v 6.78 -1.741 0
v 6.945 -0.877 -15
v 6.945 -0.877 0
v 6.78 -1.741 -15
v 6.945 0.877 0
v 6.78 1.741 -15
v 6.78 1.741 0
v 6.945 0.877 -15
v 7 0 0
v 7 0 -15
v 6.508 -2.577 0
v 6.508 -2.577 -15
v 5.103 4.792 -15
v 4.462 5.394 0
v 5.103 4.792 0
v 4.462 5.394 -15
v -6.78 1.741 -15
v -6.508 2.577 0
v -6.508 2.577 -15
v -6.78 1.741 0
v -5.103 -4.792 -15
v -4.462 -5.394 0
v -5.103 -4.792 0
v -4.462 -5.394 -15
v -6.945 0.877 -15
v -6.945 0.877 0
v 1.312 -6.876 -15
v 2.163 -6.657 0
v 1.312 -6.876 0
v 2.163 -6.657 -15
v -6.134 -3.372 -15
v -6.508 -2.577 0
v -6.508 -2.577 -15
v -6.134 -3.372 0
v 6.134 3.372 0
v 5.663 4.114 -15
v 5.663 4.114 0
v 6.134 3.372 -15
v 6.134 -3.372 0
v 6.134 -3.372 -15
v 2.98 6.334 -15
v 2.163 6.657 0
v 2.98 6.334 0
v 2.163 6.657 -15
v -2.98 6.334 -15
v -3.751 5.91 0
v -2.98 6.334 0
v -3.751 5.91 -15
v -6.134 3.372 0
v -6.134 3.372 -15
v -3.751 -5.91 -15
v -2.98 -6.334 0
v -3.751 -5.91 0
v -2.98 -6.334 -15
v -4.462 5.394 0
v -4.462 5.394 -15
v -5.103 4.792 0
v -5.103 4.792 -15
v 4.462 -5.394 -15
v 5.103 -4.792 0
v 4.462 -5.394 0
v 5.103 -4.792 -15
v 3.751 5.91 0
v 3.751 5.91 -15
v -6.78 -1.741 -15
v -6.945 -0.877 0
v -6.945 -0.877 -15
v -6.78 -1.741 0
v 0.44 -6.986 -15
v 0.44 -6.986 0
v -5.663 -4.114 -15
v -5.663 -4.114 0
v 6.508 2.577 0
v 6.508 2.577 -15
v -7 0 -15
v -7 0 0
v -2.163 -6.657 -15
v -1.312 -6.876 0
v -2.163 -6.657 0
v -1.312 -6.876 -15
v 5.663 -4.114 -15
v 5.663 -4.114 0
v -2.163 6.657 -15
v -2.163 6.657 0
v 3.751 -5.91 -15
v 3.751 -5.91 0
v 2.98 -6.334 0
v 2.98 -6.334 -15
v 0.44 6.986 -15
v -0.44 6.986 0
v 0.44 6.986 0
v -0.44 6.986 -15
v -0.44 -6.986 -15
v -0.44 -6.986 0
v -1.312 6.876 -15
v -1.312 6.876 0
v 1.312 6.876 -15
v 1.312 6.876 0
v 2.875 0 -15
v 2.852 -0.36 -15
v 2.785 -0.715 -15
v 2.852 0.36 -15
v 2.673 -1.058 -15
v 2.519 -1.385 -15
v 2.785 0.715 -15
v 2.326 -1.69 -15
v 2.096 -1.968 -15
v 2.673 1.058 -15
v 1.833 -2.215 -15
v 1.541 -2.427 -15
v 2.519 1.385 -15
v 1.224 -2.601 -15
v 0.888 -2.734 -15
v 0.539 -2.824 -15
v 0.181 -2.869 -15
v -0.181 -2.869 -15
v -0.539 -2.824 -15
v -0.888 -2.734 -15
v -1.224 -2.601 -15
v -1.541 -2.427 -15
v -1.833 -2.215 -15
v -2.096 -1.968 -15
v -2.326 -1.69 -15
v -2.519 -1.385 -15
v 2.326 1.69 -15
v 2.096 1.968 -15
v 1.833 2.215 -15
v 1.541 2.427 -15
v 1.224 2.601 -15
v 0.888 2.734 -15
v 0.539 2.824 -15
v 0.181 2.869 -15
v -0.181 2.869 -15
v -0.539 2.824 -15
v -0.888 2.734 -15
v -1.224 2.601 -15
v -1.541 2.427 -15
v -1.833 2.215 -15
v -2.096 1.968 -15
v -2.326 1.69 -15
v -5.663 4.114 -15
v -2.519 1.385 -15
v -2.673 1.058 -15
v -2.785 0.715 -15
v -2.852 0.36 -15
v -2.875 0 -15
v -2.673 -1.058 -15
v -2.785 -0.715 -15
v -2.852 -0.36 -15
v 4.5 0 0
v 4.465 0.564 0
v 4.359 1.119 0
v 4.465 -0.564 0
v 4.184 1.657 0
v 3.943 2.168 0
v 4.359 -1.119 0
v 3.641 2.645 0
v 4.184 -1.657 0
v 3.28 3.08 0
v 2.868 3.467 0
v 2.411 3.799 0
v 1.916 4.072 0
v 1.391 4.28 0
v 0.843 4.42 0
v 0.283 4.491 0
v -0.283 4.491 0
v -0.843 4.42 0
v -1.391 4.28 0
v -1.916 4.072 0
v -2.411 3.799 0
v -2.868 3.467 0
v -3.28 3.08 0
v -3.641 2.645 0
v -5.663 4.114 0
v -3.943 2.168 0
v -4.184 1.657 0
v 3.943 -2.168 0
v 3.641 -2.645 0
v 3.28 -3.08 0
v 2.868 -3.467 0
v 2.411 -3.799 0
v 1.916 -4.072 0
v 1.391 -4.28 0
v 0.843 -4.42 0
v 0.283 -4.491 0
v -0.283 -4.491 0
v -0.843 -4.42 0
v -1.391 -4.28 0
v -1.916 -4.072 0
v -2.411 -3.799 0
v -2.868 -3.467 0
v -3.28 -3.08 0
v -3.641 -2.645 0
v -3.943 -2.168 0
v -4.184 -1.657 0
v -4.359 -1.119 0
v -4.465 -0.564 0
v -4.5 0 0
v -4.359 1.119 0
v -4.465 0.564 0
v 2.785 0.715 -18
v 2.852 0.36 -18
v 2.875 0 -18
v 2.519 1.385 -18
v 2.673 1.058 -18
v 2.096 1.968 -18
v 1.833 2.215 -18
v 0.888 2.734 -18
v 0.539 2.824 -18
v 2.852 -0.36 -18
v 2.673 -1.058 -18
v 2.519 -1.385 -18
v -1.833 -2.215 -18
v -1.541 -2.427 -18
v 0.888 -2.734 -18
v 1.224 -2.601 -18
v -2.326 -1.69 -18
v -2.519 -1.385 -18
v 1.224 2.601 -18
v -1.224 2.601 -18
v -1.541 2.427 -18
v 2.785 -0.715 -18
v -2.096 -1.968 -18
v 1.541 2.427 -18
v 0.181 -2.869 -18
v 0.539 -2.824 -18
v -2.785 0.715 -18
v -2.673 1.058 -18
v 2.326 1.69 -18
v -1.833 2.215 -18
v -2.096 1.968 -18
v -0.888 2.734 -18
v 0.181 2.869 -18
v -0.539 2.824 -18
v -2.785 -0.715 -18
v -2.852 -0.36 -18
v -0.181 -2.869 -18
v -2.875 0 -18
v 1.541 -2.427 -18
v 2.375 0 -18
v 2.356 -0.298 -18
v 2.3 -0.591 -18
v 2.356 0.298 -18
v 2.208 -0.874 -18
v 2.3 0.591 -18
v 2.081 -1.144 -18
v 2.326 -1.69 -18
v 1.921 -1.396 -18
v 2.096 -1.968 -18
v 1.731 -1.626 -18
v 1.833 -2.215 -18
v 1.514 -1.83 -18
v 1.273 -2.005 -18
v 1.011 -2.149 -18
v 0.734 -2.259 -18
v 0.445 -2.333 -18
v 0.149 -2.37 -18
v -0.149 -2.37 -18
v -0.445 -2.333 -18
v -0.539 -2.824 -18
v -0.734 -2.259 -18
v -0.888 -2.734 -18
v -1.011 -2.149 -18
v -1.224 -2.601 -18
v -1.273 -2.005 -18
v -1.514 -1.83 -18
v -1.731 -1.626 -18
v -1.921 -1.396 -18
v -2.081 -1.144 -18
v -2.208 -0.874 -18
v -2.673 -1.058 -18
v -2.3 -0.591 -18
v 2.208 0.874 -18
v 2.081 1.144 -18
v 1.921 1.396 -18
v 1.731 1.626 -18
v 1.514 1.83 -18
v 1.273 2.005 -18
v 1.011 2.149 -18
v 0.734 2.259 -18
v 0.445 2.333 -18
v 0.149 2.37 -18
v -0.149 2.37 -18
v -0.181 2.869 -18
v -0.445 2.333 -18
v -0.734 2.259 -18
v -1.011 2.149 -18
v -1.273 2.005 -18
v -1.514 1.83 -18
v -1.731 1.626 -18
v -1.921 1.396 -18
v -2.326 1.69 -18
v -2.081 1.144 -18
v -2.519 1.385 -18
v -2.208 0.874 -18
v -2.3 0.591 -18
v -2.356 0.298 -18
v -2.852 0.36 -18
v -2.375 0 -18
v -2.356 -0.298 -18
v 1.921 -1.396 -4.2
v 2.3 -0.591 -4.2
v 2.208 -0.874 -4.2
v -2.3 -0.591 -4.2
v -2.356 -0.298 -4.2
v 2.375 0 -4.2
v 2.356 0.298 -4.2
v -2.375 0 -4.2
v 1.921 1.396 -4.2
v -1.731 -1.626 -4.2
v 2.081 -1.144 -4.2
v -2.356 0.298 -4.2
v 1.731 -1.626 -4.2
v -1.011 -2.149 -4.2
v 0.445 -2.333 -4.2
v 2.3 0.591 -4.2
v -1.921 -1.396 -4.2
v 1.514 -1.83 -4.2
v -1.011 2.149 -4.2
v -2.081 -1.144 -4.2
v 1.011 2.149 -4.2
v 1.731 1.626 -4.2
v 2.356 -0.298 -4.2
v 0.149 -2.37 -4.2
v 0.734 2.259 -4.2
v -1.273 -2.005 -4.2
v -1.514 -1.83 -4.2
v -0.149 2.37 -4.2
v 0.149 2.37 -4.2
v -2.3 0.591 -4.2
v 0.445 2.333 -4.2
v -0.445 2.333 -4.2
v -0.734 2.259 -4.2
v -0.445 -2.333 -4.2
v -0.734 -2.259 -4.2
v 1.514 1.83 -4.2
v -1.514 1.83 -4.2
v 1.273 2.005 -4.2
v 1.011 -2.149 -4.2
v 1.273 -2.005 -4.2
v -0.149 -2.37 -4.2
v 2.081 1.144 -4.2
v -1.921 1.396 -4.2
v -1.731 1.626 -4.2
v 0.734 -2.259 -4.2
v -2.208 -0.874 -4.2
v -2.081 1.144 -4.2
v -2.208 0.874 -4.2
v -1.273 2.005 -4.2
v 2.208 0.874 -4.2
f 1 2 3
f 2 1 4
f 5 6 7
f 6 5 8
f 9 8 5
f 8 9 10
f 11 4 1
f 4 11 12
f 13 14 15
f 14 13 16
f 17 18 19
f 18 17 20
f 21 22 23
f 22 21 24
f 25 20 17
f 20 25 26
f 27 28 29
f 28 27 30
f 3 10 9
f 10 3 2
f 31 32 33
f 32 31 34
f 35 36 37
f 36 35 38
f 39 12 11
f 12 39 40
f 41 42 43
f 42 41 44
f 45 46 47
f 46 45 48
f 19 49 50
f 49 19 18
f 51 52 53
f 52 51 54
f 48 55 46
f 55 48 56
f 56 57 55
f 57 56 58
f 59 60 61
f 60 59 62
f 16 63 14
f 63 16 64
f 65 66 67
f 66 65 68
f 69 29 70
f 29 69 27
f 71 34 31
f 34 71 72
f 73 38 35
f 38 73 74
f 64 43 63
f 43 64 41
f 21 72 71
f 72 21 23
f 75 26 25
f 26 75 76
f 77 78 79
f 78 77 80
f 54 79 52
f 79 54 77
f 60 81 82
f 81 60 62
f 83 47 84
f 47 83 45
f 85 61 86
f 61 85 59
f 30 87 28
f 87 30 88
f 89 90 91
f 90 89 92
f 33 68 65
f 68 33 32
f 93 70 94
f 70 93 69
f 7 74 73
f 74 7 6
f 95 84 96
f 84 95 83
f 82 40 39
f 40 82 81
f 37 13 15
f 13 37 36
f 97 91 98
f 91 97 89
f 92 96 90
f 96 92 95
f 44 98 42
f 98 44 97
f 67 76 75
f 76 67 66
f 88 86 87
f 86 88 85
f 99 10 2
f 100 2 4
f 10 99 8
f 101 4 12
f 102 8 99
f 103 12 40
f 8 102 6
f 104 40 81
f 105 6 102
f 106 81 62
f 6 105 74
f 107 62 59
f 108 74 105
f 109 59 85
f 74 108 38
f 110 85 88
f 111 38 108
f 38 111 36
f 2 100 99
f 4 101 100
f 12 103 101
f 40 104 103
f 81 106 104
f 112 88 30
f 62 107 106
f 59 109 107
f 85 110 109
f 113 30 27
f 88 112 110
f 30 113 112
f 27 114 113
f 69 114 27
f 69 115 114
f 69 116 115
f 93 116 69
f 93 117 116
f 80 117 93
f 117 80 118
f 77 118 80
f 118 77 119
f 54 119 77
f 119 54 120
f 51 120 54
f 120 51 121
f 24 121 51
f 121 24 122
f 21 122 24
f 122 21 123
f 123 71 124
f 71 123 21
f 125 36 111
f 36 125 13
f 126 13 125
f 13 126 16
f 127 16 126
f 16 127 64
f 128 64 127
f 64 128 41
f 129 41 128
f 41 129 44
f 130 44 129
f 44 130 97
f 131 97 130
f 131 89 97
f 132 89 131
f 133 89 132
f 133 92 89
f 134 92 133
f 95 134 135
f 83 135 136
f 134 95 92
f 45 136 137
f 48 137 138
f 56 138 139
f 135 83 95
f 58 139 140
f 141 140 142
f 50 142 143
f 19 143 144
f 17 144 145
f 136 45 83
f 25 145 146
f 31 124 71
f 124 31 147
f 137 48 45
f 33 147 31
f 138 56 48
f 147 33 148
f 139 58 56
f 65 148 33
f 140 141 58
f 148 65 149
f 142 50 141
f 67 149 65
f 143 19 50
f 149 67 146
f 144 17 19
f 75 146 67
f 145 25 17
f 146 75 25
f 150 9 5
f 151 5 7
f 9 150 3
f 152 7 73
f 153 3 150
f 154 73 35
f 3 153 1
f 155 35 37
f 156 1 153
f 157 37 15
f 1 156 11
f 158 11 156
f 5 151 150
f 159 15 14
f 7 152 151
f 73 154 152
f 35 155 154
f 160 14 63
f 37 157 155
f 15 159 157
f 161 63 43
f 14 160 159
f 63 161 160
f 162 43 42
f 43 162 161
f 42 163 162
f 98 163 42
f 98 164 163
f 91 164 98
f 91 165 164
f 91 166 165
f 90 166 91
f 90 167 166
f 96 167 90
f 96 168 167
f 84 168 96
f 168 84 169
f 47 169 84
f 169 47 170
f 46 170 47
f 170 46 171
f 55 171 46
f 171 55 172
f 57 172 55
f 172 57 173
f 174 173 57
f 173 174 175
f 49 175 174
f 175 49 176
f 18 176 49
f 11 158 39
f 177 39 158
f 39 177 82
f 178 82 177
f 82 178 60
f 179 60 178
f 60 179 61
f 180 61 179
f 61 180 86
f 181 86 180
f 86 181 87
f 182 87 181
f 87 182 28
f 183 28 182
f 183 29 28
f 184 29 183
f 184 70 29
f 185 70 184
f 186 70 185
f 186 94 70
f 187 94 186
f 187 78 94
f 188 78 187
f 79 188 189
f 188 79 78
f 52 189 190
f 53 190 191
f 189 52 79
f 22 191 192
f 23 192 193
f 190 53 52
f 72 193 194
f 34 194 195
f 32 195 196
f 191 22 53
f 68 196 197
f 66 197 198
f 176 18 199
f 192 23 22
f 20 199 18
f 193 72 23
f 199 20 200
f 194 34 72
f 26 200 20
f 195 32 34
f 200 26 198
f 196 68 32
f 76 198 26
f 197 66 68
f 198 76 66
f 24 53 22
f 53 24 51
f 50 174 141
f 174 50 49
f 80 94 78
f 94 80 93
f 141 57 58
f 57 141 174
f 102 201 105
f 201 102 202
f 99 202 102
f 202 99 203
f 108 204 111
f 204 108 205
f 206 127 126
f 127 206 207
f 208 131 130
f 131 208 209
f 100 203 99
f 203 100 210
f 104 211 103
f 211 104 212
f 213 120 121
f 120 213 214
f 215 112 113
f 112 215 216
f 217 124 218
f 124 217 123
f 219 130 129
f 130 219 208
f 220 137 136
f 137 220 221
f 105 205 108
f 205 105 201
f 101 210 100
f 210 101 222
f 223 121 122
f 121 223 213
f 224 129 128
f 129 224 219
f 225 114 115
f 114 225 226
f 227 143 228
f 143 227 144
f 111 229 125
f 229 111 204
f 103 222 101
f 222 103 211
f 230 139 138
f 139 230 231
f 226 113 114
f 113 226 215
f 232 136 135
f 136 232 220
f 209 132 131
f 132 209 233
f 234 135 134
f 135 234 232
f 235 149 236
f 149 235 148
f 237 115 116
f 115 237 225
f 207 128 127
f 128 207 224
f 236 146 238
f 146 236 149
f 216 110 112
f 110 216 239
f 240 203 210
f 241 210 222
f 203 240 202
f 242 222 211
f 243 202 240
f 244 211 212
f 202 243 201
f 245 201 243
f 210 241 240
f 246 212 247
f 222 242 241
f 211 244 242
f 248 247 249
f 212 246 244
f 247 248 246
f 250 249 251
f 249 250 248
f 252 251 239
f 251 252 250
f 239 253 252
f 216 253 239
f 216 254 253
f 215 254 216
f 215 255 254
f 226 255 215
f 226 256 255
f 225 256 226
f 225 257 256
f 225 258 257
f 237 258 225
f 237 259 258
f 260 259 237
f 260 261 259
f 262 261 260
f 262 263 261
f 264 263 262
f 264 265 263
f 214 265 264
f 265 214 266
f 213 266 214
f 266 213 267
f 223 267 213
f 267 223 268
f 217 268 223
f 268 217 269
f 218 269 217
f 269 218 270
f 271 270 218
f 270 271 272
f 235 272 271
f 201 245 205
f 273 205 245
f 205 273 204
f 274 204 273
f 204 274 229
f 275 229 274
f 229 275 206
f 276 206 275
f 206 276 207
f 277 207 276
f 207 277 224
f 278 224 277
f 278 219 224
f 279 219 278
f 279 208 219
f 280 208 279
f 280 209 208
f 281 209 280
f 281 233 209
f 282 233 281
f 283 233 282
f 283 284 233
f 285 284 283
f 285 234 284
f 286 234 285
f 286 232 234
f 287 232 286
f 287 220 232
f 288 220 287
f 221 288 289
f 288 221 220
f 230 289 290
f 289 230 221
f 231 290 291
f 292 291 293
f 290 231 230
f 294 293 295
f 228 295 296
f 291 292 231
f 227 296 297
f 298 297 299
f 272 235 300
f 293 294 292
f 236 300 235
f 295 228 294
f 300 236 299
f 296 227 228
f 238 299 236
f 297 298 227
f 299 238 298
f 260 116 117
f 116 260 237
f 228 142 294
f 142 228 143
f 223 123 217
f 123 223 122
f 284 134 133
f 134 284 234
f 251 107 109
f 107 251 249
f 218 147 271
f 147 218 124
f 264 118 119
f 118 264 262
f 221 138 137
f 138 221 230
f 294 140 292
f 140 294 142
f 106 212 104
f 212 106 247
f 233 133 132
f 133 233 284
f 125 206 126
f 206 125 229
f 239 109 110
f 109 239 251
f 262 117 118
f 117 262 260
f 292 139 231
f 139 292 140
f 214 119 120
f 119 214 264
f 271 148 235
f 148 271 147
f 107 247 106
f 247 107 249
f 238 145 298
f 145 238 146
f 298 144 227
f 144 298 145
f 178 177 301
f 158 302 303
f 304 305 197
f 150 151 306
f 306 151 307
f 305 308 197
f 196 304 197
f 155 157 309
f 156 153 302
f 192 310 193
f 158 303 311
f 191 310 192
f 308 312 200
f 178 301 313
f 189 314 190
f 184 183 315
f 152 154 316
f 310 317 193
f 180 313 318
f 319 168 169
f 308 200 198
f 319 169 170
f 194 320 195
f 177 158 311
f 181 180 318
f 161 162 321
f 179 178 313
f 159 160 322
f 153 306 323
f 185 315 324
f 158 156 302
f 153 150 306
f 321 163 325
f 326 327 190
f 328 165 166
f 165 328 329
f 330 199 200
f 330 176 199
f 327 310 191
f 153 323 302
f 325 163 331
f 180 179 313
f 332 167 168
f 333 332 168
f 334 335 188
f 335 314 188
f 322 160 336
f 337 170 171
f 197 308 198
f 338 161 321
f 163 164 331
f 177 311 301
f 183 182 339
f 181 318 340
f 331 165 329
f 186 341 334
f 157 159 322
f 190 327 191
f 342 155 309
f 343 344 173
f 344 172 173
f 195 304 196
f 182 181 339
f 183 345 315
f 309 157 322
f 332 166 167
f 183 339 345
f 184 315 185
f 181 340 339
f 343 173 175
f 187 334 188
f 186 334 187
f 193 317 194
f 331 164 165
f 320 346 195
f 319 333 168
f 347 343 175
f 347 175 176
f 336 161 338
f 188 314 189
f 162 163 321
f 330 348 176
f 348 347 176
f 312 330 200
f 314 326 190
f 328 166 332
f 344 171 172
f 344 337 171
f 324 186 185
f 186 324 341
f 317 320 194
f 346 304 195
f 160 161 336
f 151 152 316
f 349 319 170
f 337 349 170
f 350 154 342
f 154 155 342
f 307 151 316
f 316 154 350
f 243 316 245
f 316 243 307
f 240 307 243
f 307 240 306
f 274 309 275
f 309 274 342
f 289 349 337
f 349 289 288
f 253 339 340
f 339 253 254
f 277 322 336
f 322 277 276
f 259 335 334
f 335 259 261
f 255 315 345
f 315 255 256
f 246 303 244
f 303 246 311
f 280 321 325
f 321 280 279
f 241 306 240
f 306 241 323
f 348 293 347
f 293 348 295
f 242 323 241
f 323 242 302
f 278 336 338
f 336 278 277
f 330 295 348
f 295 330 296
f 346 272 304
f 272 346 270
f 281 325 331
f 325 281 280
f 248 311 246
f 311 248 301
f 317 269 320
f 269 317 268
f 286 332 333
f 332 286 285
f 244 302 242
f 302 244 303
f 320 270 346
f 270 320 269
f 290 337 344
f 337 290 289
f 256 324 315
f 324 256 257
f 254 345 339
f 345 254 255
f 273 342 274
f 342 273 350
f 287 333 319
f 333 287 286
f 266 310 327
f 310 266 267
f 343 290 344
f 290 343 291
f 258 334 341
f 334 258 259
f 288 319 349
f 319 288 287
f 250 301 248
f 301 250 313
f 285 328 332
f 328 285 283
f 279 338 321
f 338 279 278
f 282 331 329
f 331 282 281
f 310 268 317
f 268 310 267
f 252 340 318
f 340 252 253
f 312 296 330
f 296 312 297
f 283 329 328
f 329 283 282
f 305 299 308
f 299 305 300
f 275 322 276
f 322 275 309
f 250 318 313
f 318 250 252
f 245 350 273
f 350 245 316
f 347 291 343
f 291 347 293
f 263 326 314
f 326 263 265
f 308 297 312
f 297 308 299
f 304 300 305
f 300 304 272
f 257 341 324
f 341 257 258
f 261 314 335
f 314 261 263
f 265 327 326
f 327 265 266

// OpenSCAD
$fn = 50;

difference() {
	union() {
		translate(v = [0, 0, -15.0]) {
			cylinder(h = 15, r = 7.0);
		}
		#translate(v = [0, 0, -18.0]) {
			cylinder(h = 18, r = 2.875);
		}
	}
	union() {
		translate(v = [0, 0, 0]) {
			rotate(a = [0, 0, 0]) {
				difference() {
					union() {
						translate(v = [0, 0, -18.0]) {
							cylinder(h = 18, r = 2.25);
						}
						translate(v = [0, 0, -4.2]) {
							cylinder(h = 4.2, r1 = 2.375, r2 = 4.5);
						}
						translate(v = [0, 0, -18.0]) {
							cylinder(h = 18, r = 2.375);
						}
						translate(v = [0, 0, -18.0]) {
							cylinder(h = 18, r = 2.25);
						}
					}
					union();
				}
			}
		}
	}
}
